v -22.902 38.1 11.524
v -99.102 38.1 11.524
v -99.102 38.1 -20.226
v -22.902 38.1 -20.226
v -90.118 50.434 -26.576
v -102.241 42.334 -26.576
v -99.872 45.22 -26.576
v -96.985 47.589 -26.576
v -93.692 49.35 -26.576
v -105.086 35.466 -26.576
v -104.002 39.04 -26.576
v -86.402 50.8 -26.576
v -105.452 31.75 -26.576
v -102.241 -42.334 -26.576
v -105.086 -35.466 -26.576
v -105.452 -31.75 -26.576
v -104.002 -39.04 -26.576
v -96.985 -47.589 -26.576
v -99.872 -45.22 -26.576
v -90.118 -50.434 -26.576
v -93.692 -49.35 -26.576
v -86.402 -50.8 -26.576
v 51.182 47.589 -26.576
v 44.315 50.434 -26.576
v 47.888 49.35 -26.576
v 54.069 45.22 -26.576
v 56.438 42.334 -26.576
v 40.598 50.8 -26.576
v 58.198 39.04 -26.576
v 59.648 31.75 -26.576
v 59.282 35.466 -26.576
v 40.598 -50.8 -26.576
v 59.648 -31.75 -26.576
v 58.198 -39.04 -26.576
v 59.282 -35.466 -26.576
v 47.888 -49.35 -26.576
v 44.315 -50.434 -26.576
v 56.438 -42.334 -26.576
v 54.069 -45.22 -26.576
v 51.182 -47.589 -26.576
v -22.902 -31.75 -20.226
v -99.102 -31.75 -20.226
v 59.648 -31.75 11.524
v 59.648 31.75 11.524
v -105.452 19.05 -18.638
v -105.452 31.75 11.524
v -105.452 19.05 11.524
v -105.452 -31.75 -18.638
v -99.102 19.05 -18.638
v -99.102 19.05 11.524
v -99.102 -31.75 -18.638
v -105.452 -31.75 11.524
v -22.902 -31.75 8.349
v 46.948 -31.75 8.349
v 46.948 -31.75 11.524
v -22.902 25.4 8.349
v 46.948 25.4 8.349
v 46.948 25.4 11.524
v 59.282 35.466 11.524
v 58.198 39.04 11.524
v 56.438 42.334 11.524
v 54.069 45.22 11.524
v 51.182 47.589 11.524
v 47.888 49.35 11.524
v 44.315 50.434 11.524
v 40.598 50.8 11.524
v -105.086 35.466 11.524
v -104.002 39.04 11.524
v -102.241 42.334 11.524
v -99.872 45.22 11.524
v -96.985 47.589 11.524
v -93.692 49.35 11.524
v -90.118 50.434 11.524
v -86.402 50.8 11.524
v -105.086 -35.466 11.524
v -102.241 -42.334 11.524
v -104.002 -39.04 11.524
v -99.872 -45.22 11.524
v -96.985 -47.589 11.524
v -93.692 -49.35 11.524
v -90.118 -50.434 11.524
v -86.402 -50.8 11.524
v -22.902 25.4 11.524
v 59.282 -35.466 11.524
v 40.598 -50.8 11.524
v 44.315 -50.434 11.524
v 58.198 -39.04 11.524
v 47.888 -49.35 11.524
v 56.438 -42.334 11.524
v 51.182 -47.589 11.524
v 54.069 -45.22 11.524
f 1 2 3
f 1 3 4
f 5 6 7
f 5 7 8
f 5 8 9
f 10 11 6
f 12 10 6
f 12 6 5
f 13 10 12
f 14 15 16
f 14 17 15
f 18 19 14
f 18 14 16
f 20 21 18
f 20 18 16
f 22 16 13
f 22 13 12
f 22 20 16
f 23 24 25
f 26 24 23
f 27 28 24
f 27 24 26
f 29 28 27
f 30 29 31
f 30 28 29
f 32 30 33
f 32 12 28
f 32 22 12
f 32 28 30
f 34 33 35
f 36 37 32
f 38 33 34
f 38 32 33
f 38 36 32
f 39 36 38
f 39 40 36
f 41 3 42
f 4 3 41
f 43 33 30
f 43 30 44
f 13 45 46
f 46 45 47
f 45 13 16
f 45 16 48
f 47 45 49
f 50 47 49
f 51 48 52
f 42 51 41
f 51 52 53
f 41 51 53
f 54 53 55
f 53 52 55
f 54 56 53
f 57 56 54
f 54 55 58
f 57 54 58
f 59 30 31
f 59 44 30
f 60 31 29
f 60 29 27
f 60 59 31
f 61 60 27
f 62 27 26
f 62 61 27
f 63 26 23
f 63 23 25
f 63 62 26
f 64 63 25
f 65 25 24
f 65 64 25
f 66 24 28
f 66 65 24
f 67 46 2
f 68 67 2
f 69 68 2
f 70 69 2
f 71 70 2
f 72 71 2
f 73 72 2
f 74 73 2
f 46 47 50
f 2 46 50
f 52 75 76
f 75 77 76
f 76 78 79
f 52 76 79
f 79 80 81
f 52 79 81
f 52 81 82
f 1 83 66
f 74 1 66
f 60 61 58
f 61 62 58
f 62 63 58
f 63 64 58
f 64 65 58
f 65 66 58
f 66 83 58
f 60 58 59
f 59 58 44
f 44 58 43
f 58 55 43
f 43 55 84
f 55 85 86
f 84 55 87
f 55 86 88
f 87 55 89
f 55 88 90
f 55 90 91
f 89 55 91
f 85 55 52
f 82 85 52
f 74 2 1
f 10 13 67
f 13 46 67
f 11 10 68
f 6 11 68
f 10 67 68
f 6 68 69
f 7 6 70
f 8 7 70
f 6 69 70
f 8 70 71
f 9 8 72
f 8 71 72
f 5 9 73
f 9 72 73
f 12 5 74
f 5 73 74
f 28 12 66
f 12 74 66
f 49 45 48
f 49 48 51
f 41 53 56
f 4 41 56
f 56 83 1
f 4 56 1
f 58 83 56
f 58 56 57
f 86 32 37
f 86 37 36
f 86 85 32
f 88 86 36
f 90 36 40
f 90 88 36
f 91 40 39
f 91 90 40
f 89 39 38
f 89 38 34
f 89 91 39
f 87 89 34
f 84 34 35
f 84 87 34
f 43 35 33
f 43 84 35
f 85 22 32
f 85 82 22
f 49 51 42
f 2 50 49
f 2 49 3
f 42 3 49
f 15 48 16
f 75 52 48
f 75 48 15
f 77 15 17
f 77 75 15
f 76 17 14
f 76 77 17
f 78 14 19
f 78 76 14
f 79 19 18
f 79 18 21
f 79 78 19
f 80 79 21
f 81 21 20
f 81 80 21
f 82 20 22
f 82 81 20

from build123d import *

# Parameters (mm, degrees)
F0_W     = 165.1
F0_H     = 38.1
F1_DEPTH = 50.8
F2_W     = 76.2
F2_H     = 69.85
F3_DEPTH = 31.75
F5_W     = 6.35
F5_H     = 50.8
F6_DEPTH = 30.1625
F7_W     = 69.85
F7_H     = 57.15
F8_DEPTH = 3.175
F9_R     = 19.05
F10_R    = 19.05
F11_R    = 19.05


with BuildPart() as f1:
    # F0 (on Front) → F1 (new body, symmetric)
    with BuildSketch(Plane.XZ):
        with Locations((-22.901768, -7.525502)):
            Rectangle(F0_W, F0_H)
    extrude(amount=F1_DEPTH, both=True)

    # F2 (on face) → F3 (cut)
    with BuildSketch(Plane.XY.offset(11.524498)):
        with Locations((-61.001768, 3.175)):
            Rectangle(F2_W, F2_H)
    extrude(amount=-F3_DEPTH, mode=Mode.SUBTRACT)

    # F5 (on face) → F6 (cut)
    with BuildSketch(Plane.XY.offset(11.524498)):
        with Locations((-102.276768, -6.35)):
            Rectangle(F5_W, F5_H)
    extrude(amount=-F6_DEPTH, mode=Mode.SUBTRACT)

    # F7 (on face) → F8 (cut)
    with BuildSketch(Plane.XY.offset(11.524498)):
        with Locations((12.023232, -3.175)):
            Rectangle(F7_W, F7_H)
    extrude(amount=-F8_DEPTH, mode=Mode.SUBTRACT)

    # F9
    f9_edges = [f1.edges().sort_by_distance(p)[0] for p in [
        (-105.451768, -50.8, -7.525502),
    ]]
    fillet(f9_edges, radius=F9_R)

    # F10
    f10_edges = [f1.edges().sort_by_distance(p)[0] for p in [
        (59.648232, -50.8, -7.525502),
    ]]
    fillet(f10_edges, radius=F10_R)

    # F11
    f11_edges = [f1.edges().sort_by_distance(p)[0] for p in [
        (59.648232, 50.8, -7.525502),
        (-105.451768, 50.8, -7.525502),
    ]]
    fillet(f11_edges, radius=F11_R)


solid = f1.part
